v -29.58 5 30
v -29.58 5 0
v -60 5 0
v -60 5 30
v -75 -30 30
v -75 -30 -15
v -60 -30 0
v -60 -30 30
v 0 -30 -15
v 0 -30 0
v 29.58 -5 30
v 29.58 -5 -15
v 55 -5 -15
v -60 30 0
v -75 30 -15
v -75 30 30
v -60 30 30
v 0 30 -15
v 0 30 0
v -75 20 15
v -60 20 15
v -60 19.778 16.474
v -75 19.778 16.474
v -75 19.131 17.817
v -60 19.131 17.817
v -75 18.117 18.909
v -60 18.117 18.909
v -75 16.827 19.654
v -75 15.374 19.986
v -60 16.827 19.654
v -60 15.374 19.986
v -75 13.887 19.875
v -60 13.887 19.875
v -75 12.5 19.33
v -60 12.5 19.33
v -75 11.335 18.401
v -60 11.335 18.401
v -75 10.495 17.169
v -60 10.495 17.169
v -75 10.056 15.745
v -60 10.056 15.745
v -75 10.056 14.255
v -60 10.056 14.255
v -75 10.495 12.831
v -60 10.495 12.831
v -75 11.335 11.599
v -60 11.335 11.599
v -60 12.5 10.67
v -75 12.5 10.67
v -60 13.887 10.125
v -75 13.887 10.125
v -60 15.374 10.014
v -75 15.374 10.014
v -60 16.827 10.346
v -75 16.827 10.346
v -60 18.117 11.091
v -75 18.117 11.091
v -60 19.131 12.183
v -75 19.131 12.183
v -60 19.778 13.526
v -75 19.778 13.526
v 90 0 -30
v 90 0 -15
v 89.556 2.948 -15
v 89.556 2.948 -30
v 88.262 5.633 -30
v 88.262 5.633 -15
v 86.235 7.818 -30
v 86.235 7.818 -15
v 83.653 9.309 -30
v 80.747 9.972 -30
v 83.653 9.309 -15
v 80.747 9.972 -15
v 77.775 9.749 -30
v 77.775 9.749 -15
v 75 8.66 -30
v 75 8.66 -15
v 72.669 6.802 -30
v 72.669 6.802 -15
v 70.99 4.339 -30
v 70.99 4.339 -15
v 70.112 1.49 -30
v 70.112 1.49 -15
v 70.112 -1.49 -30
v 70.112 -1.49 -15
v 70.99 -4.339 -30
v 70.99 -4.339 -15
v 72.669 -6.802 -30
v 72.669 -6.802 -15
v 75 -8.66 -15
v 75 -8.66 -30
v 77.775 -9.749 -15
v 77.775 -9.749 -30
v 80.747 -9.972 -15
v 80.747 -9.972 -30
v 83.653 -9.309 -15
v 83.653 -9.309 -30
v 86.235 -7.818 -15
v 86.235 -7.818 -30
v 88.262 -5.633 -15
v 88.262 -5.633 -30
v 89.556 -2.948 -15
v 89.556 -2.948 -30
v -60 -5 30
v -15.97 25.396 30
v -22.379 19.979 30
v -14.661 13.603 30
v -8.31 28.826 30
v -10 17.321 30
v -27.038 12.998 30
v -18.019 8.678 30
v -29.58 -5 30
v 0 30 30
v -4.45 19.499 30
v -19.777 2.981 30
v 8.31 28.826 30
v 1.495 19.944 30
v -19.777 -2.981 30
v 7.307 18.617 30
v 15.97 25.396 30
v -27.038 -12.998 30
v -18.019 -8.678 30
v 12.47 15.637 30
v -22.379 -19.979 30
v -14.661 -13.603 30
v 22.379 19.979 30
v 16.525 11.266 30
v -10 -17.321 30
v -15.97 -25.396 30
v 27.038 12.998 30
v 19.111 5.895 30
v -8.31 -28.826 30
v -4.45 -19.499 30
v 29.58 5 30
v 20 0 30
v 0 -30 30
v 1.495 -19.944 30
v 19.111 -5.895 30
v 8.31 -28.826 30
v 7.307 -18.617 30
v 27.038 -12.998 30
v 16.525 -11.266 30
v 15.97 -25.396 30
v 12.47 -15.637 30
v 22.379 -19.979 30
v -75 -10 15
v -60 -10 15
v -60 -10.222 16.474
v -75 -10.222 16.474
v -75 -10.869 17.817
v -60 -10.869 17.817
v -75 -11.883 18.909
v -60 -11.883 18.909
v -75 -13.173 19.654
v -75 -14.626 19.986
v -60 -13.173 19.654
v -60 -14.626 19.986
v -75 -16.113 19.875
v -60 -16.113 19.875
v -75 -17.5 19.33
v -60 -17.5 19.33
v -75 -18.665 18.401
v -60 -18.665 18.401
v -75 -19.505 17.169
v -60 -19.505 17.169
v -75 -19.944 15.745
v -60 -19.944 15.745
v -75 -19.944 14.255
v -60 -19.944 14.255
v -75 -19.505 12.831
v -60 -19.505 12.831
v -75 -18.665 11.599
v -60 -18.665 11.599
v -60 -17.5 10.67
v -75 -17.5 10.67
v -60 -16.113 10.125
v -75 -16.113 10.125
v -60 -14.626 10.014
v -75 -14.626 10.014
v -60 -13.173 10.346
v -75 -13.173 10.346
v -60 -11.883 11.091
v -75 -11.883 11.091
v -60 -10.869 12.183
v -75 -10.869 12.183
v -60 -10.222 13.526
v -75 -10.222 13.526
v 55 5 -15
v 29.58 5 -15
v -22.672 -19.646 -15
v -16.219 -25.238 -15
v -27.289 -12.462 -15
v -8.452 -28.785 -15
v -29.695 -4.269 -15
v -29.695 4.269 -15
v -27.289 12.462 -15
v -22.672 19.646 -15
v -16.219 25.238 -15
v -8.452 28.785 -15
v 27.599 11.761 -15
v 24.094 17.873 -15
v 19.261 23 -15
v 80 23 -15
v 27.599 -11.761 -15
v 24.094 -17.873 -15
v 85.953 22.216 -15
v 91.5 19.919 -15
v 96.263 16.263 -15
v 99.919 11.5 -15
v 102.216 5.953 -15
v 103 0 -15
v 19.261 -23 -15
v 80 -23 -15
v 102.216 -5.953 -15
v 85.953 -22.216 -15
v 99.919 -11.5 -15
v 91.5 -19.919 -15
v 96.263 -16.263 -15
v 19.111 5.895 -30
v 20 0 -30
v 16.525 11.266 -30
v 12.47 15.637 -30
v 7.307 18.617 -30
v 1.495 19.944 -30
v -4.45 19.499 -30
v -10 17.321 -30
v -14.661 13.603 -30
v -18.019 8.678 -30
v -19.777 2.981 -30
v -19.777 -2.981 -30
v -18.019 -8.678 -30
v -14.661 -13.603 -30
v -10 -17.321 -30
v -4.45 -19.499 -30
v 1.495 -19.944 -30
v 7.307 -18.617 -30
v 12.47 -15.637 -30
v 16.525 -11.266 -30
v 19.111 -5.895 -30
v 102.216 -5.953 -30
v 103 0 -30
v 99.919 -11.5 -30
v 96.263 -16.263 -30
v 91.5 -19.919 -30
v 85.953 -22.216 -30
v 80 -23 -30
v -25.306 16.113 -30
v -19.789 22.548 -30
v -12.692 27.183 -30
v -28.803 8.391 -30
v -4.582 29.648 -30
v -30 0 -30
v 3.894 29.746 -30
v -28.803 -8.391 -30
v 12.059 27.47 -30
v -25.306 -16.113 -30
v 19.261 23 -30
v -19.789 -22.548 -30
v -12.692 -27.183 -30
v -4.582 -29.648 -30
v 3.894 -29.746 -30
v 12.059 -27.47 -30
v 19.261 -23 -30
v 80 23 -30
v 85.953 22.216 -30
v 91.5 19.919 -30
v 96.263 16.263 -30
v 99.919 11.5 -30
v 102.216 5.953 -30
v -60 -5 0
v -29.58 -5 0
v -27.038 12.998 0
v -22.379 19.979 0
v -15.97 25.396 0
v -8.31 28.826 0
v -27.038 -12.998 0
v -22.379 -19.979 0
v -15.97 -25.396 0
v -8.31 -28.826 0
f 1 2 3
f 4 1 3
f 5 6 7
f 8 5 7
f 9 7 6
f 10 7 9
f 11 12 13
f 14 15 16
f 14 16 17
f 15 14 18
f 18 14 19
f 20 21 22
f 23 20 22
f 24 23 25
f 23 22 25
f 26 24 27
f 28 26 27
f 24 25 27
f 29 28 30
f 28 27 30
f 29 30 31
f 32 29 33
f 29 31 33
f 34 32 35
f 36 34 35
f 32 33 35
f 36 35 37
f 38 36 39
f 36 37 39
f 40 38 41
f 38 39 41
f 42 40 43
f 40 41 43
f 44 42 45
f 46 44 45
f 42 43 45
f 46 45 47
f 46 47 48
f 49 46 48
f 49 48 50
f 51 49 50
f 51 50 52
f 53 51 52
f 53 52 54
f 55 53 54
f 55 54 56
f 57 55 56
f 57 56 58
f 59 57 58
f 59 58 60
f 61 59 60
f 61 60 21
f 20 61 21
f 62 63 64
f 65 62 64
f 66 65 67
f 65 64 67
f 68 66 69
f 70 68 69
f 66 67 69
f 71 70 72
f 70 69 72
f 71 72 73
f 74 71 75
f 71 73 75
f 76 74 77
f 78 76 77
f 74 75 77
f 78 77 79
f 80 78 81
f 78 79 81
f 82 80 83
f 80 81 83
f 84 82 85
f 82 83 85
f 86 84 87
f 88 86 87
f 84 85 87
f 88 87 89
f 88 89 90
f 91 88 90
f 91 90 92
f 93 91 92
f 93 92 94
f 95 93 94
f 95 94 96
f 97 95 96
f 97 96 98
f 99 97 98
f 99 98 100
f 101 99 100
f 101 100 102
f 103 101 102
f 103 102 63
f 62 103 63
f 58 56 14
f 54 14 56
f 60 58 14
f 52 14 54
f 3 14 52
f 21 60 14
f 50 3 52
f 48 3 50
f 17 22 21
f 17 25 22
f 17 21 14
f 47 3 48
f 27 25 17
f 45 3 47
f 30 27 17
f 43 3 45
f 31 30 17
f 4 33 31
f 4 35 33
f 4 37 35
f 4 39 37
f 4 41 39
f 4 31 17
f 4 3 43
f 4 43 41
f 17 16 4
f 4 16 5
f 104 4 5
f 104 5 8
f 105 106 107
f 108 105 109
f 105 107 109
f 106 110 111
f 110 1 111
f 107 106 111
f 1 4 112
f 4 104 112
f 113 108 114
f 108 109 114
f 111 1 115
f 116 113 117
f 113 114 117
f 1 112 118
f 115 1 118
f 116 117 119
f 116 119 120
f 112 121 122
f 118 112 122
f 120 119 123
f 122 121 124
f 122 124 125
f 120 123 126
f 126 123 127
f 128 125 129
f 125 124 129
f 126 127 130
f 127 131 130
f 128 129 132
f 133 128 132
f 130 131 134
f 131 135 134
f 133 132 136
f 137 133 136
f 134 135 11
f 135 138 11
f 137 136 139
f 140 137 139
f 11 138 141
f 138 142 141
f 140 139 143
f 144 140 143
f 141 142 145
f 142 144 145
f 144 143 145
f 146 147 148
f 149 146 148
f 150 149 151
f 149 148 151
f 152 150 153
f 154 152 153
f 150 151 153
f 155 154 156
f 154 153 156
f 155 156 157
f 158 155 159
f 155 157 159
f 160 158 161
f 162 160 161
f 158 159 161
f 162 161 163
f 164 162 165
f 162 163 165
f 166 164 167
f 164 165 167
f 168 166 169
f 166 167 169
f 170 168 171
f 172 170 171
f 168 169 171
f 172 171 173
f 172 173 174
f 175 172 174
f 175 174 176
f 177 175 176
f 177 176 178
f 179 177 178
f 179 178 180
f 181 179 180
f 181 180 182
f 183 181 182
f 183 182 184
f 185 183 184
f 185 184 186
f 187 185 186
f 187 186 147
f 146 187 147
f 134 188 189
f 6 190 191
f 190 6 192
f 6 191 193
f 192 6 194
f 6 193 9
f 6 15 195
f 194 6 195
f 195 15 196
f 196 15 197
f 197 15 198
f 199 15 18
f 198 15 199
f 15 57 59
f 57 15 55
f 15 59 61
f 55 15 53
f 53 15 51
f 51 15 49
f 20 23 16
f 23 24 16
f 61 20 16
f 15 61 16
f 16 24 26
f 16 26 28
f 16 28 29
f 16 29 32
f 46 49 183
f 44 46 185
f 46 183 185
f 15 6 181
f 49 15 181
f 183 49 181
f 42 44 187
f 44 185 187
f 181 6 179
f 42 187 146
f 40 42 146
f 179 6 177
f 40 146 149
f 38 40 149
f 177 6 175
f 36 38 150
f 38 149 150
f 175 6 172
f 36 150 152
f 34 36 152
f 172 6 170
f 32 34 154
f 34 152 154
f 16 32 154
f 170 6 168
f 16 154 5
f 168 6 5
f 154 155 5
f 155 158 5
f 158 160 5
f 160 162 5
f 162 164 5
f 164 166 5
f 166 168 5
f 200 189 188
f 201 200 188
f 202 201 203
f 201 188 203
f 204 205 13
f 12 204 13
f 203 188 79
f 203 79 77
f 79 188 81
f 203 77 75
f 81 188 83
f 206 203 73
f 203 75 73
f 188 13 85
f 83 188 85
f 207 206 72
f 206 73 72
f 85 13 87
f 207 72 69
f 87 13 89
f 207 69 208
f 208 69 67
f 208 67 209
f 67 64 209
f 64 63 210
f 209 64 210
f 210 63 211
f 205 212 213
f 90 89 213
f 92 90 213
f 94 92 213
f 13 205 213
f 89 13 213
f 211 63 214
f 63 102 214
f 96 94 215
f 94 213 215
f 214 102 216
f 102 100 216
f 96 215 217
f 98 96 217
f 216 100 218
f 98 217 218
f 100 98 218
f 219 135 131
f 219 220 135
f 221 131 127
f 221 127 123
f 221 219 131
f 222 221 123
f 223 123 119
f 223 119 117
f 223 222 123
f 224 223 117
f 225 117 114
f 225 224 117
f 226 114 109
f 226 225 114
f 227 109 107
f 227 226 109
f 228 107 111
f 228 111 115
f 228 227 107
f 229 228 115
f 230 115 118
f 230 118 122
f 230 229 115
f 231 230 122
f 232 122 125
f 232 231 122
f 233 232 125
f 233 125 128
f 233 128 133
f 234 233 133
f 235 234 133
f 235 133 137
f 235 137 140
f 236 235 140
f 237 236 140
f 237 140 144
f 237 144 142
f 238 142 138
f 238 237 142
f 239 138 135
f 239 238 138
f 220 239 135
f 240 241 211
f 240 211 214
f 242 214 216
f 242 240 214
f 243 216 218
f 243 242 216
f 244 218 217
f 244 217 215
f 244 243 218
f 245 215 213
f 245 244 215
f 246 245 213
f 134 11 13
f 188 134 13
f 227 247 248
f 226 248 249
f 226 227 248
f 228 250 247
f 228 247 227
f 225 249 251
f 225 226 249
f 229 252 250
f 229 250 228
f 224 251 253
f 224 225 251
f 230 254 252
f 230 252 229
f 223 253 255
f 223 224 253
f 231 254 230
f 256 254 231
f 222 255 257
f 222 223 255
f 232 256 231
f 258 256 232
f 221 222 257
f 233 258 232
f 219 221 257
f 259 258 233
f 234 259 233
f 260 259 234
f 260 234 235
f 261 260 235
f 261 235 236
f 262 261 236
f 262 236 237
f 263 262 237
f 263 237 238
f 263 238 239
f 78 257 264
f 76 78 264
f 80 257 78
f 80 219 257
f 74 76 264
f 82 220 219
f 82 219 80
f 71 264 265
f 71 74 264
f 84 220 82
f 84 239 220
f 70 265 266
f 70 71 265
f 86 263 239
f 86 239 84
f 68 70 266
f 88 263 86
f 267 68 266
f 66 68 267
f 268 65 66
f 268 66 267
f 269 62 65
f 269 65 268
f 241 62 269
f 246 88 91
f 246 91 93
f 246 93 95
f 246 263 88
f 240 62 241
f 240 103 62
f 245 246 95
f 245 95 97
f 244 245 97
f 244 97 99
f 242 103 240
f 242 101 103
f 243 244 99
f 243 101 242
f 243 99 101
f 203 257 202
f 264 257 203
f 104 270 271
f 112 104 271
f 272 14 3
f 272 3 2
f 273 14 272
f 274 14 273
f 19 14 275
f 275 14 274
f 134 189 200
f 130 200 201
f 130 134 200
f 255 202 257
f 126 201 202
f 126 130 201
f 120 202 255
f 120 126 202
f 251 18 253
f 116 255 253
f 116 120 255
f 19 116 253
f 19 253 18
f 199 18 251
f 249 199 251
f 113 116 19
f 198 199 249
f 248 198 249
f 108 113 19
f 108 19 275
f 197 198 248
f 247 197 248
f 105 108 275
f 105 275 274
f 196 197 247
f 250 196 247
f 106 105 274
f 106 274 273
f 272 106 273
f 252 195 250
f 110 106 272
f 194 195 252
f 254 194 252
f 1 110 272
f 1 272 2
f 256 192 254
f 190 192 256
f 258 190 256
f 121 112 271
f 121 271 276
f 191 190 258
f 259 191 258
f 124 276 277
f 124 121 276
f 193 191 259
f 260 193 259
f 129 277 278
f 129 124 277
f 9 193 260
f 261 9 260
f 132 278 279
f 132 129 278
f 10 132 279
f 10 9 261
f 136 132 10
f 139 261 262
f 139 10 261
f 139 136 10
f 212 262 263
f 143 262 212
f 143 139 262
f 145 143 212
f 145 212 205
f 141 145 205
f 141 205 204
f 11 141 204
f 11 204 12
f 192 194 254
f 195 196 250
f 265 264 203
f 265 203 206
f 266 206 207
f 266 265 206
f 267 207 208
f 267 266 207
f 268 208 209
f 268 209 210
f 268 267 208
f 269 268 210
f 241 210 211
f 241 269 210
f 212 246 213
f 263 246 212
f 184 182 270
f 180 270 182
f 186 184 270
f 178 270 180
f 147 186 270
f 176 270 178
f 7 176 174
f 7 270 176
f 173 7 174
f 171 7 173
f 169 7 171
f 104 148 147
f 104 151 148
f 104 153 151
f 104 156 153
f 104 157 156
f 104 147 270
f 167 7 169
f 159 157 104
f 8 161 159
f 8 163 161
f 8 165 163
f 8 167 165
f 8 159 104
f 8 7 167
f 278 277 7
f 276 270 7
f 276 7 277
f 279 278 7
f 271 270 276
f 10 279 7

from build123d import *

# Parameters (mm, degrees)
F0_R      = 30
F0_R_2    = 20
F1_DEPTH  = 30
F3_DEPTH  = 15
F4_R      = 10
F5_DEPTH  = 25
F7_DEPTH  = 45
F9_DEPTH  = 35.001
F11_DEPTH = 15
F12_W     = 15
F12_H     = 30
F13_DEPTH = 30
F15_DEPTH = 30
F16_R     = 5
F17_DEPTH = 15.001


with BuildPart() as f1:
    # F0 (on Top) → F1 (new body, symmetric)
    with BuildSketch(Plane.XY):
        Circle(F0_R)
        Circle(F0_R_2, mode=Mode.SUBTRACT)
    extrude(amount=F1_DEPTH, both=True)

    # F2 (on face) → F3 (join)
    with BuildSketch(Plane(origin=(0, 0, -30), x_dir=(1, 0, 0), z_dir=(0, 0, -1))):
        with BuildLine():
            ThreePointArc((103, 0), (96.2634559673, 16.2634559673), (80, 23))
            Line((80, 23), (80, -23))
            ThreePointArc((80, -23), (96.2634559673, -16.2634559673), (103, 0))
        make_face()
        with BuildLine():
            ThreePointArc((80, -23), (57, 0), (80, 23))
            Line((80, 23), (19.2613602843, 23))
            ThreePointArc((19.2613602843, 23), (30, 0), (19.2613602843, -23))
            Line((19.2613602843, -23), (80, -23))
        make_face()
        with BuildLine():
            Line((80, -23), (80, 23))
            ThreePointArc((80, 23), (57, 0), (80, -23))
        make_face()
    extrude(amount=-F3_DEPTH)

    # F4 (on face) → F5 (cut)
    with BuildSketch(Plane.XY.offset(-15)):
        with Locations((80, 0)):
            Circle(F4_R)
    extrude(amount=-F5_DEPTH, mode=Mode.SUBTRACT)

    # F6 (on face) → F7 (join)
    with BuildSketch(Plane.XY.offset(-15)):
        with BuildLine():
            Line((55, 5), (29.5803989155, 5))
            ThreePointArc((29.5803989155, 5), (30, 0), (29.5803989155, -5))
            Line((29.5803989155, -5), (55, -5))
            Line((55, -5), (55, 5))
        make_face()
    extrude(amount=F7_DEPTH)

    # F8 (on face) → F9 (cut, through all)
    with BuildSketch(Plane.XZ.offset(5)):
        Polygon((29.5803989155, 30), (55, -15), (55, 30), align=None)
    extrude(amount=-F9_DEPTH, mode=Mode.SUBTRACT)

    # F10 (on Top) → F11 (join)
    with BuildSketch(Plane.XY):
        with BuildLine():
            ThreePointArc((0, -30), (-30, 0), (0, 30))
            Line((0, 30), (-75, 30))
            Line((-75, 30), (-75, -30))
            Line((-75, -30), (0, -30))
        make_face()
    extrude(amount=-F11_DEPTH)

    # F12 (on Front) → F13 (join, symmetric)
    with BuildSketch(Plane.XZ):
        with Locations((-67.5, 15)):
            Rectangle(F12_W, F12_H)
    extrude(amount=F13_DEPTH, both=True)

    # F14 (on Top) → F15 (join)
    with BuildSketch(Plane.XY):
        with BuildLine():
            Line((-29.5803989155, 5), (-60, 5))
            Line((-60, 5), (-60, -5))
            Line((-60, -5), (-29.5803989155, -5))
            ThreePointArc((-29.5803989155, -5), (-30, 0), (-29.5803989155, 5))
        make_face()
    extrude(amount=F15_DEPTH)

    # F16 (on face) → F17 (cut, through all)
    with BuildSketch(Plane.YZ.offset(-60)):
        with Locations((-15, 15)):
            Circle(F16_R)
        with Locations((15, 15)):
            Circle(F16_R)
    extrude(amount=-F17_DEPTH, mode=Mode.SUBTRACT)


solid = f1.part
